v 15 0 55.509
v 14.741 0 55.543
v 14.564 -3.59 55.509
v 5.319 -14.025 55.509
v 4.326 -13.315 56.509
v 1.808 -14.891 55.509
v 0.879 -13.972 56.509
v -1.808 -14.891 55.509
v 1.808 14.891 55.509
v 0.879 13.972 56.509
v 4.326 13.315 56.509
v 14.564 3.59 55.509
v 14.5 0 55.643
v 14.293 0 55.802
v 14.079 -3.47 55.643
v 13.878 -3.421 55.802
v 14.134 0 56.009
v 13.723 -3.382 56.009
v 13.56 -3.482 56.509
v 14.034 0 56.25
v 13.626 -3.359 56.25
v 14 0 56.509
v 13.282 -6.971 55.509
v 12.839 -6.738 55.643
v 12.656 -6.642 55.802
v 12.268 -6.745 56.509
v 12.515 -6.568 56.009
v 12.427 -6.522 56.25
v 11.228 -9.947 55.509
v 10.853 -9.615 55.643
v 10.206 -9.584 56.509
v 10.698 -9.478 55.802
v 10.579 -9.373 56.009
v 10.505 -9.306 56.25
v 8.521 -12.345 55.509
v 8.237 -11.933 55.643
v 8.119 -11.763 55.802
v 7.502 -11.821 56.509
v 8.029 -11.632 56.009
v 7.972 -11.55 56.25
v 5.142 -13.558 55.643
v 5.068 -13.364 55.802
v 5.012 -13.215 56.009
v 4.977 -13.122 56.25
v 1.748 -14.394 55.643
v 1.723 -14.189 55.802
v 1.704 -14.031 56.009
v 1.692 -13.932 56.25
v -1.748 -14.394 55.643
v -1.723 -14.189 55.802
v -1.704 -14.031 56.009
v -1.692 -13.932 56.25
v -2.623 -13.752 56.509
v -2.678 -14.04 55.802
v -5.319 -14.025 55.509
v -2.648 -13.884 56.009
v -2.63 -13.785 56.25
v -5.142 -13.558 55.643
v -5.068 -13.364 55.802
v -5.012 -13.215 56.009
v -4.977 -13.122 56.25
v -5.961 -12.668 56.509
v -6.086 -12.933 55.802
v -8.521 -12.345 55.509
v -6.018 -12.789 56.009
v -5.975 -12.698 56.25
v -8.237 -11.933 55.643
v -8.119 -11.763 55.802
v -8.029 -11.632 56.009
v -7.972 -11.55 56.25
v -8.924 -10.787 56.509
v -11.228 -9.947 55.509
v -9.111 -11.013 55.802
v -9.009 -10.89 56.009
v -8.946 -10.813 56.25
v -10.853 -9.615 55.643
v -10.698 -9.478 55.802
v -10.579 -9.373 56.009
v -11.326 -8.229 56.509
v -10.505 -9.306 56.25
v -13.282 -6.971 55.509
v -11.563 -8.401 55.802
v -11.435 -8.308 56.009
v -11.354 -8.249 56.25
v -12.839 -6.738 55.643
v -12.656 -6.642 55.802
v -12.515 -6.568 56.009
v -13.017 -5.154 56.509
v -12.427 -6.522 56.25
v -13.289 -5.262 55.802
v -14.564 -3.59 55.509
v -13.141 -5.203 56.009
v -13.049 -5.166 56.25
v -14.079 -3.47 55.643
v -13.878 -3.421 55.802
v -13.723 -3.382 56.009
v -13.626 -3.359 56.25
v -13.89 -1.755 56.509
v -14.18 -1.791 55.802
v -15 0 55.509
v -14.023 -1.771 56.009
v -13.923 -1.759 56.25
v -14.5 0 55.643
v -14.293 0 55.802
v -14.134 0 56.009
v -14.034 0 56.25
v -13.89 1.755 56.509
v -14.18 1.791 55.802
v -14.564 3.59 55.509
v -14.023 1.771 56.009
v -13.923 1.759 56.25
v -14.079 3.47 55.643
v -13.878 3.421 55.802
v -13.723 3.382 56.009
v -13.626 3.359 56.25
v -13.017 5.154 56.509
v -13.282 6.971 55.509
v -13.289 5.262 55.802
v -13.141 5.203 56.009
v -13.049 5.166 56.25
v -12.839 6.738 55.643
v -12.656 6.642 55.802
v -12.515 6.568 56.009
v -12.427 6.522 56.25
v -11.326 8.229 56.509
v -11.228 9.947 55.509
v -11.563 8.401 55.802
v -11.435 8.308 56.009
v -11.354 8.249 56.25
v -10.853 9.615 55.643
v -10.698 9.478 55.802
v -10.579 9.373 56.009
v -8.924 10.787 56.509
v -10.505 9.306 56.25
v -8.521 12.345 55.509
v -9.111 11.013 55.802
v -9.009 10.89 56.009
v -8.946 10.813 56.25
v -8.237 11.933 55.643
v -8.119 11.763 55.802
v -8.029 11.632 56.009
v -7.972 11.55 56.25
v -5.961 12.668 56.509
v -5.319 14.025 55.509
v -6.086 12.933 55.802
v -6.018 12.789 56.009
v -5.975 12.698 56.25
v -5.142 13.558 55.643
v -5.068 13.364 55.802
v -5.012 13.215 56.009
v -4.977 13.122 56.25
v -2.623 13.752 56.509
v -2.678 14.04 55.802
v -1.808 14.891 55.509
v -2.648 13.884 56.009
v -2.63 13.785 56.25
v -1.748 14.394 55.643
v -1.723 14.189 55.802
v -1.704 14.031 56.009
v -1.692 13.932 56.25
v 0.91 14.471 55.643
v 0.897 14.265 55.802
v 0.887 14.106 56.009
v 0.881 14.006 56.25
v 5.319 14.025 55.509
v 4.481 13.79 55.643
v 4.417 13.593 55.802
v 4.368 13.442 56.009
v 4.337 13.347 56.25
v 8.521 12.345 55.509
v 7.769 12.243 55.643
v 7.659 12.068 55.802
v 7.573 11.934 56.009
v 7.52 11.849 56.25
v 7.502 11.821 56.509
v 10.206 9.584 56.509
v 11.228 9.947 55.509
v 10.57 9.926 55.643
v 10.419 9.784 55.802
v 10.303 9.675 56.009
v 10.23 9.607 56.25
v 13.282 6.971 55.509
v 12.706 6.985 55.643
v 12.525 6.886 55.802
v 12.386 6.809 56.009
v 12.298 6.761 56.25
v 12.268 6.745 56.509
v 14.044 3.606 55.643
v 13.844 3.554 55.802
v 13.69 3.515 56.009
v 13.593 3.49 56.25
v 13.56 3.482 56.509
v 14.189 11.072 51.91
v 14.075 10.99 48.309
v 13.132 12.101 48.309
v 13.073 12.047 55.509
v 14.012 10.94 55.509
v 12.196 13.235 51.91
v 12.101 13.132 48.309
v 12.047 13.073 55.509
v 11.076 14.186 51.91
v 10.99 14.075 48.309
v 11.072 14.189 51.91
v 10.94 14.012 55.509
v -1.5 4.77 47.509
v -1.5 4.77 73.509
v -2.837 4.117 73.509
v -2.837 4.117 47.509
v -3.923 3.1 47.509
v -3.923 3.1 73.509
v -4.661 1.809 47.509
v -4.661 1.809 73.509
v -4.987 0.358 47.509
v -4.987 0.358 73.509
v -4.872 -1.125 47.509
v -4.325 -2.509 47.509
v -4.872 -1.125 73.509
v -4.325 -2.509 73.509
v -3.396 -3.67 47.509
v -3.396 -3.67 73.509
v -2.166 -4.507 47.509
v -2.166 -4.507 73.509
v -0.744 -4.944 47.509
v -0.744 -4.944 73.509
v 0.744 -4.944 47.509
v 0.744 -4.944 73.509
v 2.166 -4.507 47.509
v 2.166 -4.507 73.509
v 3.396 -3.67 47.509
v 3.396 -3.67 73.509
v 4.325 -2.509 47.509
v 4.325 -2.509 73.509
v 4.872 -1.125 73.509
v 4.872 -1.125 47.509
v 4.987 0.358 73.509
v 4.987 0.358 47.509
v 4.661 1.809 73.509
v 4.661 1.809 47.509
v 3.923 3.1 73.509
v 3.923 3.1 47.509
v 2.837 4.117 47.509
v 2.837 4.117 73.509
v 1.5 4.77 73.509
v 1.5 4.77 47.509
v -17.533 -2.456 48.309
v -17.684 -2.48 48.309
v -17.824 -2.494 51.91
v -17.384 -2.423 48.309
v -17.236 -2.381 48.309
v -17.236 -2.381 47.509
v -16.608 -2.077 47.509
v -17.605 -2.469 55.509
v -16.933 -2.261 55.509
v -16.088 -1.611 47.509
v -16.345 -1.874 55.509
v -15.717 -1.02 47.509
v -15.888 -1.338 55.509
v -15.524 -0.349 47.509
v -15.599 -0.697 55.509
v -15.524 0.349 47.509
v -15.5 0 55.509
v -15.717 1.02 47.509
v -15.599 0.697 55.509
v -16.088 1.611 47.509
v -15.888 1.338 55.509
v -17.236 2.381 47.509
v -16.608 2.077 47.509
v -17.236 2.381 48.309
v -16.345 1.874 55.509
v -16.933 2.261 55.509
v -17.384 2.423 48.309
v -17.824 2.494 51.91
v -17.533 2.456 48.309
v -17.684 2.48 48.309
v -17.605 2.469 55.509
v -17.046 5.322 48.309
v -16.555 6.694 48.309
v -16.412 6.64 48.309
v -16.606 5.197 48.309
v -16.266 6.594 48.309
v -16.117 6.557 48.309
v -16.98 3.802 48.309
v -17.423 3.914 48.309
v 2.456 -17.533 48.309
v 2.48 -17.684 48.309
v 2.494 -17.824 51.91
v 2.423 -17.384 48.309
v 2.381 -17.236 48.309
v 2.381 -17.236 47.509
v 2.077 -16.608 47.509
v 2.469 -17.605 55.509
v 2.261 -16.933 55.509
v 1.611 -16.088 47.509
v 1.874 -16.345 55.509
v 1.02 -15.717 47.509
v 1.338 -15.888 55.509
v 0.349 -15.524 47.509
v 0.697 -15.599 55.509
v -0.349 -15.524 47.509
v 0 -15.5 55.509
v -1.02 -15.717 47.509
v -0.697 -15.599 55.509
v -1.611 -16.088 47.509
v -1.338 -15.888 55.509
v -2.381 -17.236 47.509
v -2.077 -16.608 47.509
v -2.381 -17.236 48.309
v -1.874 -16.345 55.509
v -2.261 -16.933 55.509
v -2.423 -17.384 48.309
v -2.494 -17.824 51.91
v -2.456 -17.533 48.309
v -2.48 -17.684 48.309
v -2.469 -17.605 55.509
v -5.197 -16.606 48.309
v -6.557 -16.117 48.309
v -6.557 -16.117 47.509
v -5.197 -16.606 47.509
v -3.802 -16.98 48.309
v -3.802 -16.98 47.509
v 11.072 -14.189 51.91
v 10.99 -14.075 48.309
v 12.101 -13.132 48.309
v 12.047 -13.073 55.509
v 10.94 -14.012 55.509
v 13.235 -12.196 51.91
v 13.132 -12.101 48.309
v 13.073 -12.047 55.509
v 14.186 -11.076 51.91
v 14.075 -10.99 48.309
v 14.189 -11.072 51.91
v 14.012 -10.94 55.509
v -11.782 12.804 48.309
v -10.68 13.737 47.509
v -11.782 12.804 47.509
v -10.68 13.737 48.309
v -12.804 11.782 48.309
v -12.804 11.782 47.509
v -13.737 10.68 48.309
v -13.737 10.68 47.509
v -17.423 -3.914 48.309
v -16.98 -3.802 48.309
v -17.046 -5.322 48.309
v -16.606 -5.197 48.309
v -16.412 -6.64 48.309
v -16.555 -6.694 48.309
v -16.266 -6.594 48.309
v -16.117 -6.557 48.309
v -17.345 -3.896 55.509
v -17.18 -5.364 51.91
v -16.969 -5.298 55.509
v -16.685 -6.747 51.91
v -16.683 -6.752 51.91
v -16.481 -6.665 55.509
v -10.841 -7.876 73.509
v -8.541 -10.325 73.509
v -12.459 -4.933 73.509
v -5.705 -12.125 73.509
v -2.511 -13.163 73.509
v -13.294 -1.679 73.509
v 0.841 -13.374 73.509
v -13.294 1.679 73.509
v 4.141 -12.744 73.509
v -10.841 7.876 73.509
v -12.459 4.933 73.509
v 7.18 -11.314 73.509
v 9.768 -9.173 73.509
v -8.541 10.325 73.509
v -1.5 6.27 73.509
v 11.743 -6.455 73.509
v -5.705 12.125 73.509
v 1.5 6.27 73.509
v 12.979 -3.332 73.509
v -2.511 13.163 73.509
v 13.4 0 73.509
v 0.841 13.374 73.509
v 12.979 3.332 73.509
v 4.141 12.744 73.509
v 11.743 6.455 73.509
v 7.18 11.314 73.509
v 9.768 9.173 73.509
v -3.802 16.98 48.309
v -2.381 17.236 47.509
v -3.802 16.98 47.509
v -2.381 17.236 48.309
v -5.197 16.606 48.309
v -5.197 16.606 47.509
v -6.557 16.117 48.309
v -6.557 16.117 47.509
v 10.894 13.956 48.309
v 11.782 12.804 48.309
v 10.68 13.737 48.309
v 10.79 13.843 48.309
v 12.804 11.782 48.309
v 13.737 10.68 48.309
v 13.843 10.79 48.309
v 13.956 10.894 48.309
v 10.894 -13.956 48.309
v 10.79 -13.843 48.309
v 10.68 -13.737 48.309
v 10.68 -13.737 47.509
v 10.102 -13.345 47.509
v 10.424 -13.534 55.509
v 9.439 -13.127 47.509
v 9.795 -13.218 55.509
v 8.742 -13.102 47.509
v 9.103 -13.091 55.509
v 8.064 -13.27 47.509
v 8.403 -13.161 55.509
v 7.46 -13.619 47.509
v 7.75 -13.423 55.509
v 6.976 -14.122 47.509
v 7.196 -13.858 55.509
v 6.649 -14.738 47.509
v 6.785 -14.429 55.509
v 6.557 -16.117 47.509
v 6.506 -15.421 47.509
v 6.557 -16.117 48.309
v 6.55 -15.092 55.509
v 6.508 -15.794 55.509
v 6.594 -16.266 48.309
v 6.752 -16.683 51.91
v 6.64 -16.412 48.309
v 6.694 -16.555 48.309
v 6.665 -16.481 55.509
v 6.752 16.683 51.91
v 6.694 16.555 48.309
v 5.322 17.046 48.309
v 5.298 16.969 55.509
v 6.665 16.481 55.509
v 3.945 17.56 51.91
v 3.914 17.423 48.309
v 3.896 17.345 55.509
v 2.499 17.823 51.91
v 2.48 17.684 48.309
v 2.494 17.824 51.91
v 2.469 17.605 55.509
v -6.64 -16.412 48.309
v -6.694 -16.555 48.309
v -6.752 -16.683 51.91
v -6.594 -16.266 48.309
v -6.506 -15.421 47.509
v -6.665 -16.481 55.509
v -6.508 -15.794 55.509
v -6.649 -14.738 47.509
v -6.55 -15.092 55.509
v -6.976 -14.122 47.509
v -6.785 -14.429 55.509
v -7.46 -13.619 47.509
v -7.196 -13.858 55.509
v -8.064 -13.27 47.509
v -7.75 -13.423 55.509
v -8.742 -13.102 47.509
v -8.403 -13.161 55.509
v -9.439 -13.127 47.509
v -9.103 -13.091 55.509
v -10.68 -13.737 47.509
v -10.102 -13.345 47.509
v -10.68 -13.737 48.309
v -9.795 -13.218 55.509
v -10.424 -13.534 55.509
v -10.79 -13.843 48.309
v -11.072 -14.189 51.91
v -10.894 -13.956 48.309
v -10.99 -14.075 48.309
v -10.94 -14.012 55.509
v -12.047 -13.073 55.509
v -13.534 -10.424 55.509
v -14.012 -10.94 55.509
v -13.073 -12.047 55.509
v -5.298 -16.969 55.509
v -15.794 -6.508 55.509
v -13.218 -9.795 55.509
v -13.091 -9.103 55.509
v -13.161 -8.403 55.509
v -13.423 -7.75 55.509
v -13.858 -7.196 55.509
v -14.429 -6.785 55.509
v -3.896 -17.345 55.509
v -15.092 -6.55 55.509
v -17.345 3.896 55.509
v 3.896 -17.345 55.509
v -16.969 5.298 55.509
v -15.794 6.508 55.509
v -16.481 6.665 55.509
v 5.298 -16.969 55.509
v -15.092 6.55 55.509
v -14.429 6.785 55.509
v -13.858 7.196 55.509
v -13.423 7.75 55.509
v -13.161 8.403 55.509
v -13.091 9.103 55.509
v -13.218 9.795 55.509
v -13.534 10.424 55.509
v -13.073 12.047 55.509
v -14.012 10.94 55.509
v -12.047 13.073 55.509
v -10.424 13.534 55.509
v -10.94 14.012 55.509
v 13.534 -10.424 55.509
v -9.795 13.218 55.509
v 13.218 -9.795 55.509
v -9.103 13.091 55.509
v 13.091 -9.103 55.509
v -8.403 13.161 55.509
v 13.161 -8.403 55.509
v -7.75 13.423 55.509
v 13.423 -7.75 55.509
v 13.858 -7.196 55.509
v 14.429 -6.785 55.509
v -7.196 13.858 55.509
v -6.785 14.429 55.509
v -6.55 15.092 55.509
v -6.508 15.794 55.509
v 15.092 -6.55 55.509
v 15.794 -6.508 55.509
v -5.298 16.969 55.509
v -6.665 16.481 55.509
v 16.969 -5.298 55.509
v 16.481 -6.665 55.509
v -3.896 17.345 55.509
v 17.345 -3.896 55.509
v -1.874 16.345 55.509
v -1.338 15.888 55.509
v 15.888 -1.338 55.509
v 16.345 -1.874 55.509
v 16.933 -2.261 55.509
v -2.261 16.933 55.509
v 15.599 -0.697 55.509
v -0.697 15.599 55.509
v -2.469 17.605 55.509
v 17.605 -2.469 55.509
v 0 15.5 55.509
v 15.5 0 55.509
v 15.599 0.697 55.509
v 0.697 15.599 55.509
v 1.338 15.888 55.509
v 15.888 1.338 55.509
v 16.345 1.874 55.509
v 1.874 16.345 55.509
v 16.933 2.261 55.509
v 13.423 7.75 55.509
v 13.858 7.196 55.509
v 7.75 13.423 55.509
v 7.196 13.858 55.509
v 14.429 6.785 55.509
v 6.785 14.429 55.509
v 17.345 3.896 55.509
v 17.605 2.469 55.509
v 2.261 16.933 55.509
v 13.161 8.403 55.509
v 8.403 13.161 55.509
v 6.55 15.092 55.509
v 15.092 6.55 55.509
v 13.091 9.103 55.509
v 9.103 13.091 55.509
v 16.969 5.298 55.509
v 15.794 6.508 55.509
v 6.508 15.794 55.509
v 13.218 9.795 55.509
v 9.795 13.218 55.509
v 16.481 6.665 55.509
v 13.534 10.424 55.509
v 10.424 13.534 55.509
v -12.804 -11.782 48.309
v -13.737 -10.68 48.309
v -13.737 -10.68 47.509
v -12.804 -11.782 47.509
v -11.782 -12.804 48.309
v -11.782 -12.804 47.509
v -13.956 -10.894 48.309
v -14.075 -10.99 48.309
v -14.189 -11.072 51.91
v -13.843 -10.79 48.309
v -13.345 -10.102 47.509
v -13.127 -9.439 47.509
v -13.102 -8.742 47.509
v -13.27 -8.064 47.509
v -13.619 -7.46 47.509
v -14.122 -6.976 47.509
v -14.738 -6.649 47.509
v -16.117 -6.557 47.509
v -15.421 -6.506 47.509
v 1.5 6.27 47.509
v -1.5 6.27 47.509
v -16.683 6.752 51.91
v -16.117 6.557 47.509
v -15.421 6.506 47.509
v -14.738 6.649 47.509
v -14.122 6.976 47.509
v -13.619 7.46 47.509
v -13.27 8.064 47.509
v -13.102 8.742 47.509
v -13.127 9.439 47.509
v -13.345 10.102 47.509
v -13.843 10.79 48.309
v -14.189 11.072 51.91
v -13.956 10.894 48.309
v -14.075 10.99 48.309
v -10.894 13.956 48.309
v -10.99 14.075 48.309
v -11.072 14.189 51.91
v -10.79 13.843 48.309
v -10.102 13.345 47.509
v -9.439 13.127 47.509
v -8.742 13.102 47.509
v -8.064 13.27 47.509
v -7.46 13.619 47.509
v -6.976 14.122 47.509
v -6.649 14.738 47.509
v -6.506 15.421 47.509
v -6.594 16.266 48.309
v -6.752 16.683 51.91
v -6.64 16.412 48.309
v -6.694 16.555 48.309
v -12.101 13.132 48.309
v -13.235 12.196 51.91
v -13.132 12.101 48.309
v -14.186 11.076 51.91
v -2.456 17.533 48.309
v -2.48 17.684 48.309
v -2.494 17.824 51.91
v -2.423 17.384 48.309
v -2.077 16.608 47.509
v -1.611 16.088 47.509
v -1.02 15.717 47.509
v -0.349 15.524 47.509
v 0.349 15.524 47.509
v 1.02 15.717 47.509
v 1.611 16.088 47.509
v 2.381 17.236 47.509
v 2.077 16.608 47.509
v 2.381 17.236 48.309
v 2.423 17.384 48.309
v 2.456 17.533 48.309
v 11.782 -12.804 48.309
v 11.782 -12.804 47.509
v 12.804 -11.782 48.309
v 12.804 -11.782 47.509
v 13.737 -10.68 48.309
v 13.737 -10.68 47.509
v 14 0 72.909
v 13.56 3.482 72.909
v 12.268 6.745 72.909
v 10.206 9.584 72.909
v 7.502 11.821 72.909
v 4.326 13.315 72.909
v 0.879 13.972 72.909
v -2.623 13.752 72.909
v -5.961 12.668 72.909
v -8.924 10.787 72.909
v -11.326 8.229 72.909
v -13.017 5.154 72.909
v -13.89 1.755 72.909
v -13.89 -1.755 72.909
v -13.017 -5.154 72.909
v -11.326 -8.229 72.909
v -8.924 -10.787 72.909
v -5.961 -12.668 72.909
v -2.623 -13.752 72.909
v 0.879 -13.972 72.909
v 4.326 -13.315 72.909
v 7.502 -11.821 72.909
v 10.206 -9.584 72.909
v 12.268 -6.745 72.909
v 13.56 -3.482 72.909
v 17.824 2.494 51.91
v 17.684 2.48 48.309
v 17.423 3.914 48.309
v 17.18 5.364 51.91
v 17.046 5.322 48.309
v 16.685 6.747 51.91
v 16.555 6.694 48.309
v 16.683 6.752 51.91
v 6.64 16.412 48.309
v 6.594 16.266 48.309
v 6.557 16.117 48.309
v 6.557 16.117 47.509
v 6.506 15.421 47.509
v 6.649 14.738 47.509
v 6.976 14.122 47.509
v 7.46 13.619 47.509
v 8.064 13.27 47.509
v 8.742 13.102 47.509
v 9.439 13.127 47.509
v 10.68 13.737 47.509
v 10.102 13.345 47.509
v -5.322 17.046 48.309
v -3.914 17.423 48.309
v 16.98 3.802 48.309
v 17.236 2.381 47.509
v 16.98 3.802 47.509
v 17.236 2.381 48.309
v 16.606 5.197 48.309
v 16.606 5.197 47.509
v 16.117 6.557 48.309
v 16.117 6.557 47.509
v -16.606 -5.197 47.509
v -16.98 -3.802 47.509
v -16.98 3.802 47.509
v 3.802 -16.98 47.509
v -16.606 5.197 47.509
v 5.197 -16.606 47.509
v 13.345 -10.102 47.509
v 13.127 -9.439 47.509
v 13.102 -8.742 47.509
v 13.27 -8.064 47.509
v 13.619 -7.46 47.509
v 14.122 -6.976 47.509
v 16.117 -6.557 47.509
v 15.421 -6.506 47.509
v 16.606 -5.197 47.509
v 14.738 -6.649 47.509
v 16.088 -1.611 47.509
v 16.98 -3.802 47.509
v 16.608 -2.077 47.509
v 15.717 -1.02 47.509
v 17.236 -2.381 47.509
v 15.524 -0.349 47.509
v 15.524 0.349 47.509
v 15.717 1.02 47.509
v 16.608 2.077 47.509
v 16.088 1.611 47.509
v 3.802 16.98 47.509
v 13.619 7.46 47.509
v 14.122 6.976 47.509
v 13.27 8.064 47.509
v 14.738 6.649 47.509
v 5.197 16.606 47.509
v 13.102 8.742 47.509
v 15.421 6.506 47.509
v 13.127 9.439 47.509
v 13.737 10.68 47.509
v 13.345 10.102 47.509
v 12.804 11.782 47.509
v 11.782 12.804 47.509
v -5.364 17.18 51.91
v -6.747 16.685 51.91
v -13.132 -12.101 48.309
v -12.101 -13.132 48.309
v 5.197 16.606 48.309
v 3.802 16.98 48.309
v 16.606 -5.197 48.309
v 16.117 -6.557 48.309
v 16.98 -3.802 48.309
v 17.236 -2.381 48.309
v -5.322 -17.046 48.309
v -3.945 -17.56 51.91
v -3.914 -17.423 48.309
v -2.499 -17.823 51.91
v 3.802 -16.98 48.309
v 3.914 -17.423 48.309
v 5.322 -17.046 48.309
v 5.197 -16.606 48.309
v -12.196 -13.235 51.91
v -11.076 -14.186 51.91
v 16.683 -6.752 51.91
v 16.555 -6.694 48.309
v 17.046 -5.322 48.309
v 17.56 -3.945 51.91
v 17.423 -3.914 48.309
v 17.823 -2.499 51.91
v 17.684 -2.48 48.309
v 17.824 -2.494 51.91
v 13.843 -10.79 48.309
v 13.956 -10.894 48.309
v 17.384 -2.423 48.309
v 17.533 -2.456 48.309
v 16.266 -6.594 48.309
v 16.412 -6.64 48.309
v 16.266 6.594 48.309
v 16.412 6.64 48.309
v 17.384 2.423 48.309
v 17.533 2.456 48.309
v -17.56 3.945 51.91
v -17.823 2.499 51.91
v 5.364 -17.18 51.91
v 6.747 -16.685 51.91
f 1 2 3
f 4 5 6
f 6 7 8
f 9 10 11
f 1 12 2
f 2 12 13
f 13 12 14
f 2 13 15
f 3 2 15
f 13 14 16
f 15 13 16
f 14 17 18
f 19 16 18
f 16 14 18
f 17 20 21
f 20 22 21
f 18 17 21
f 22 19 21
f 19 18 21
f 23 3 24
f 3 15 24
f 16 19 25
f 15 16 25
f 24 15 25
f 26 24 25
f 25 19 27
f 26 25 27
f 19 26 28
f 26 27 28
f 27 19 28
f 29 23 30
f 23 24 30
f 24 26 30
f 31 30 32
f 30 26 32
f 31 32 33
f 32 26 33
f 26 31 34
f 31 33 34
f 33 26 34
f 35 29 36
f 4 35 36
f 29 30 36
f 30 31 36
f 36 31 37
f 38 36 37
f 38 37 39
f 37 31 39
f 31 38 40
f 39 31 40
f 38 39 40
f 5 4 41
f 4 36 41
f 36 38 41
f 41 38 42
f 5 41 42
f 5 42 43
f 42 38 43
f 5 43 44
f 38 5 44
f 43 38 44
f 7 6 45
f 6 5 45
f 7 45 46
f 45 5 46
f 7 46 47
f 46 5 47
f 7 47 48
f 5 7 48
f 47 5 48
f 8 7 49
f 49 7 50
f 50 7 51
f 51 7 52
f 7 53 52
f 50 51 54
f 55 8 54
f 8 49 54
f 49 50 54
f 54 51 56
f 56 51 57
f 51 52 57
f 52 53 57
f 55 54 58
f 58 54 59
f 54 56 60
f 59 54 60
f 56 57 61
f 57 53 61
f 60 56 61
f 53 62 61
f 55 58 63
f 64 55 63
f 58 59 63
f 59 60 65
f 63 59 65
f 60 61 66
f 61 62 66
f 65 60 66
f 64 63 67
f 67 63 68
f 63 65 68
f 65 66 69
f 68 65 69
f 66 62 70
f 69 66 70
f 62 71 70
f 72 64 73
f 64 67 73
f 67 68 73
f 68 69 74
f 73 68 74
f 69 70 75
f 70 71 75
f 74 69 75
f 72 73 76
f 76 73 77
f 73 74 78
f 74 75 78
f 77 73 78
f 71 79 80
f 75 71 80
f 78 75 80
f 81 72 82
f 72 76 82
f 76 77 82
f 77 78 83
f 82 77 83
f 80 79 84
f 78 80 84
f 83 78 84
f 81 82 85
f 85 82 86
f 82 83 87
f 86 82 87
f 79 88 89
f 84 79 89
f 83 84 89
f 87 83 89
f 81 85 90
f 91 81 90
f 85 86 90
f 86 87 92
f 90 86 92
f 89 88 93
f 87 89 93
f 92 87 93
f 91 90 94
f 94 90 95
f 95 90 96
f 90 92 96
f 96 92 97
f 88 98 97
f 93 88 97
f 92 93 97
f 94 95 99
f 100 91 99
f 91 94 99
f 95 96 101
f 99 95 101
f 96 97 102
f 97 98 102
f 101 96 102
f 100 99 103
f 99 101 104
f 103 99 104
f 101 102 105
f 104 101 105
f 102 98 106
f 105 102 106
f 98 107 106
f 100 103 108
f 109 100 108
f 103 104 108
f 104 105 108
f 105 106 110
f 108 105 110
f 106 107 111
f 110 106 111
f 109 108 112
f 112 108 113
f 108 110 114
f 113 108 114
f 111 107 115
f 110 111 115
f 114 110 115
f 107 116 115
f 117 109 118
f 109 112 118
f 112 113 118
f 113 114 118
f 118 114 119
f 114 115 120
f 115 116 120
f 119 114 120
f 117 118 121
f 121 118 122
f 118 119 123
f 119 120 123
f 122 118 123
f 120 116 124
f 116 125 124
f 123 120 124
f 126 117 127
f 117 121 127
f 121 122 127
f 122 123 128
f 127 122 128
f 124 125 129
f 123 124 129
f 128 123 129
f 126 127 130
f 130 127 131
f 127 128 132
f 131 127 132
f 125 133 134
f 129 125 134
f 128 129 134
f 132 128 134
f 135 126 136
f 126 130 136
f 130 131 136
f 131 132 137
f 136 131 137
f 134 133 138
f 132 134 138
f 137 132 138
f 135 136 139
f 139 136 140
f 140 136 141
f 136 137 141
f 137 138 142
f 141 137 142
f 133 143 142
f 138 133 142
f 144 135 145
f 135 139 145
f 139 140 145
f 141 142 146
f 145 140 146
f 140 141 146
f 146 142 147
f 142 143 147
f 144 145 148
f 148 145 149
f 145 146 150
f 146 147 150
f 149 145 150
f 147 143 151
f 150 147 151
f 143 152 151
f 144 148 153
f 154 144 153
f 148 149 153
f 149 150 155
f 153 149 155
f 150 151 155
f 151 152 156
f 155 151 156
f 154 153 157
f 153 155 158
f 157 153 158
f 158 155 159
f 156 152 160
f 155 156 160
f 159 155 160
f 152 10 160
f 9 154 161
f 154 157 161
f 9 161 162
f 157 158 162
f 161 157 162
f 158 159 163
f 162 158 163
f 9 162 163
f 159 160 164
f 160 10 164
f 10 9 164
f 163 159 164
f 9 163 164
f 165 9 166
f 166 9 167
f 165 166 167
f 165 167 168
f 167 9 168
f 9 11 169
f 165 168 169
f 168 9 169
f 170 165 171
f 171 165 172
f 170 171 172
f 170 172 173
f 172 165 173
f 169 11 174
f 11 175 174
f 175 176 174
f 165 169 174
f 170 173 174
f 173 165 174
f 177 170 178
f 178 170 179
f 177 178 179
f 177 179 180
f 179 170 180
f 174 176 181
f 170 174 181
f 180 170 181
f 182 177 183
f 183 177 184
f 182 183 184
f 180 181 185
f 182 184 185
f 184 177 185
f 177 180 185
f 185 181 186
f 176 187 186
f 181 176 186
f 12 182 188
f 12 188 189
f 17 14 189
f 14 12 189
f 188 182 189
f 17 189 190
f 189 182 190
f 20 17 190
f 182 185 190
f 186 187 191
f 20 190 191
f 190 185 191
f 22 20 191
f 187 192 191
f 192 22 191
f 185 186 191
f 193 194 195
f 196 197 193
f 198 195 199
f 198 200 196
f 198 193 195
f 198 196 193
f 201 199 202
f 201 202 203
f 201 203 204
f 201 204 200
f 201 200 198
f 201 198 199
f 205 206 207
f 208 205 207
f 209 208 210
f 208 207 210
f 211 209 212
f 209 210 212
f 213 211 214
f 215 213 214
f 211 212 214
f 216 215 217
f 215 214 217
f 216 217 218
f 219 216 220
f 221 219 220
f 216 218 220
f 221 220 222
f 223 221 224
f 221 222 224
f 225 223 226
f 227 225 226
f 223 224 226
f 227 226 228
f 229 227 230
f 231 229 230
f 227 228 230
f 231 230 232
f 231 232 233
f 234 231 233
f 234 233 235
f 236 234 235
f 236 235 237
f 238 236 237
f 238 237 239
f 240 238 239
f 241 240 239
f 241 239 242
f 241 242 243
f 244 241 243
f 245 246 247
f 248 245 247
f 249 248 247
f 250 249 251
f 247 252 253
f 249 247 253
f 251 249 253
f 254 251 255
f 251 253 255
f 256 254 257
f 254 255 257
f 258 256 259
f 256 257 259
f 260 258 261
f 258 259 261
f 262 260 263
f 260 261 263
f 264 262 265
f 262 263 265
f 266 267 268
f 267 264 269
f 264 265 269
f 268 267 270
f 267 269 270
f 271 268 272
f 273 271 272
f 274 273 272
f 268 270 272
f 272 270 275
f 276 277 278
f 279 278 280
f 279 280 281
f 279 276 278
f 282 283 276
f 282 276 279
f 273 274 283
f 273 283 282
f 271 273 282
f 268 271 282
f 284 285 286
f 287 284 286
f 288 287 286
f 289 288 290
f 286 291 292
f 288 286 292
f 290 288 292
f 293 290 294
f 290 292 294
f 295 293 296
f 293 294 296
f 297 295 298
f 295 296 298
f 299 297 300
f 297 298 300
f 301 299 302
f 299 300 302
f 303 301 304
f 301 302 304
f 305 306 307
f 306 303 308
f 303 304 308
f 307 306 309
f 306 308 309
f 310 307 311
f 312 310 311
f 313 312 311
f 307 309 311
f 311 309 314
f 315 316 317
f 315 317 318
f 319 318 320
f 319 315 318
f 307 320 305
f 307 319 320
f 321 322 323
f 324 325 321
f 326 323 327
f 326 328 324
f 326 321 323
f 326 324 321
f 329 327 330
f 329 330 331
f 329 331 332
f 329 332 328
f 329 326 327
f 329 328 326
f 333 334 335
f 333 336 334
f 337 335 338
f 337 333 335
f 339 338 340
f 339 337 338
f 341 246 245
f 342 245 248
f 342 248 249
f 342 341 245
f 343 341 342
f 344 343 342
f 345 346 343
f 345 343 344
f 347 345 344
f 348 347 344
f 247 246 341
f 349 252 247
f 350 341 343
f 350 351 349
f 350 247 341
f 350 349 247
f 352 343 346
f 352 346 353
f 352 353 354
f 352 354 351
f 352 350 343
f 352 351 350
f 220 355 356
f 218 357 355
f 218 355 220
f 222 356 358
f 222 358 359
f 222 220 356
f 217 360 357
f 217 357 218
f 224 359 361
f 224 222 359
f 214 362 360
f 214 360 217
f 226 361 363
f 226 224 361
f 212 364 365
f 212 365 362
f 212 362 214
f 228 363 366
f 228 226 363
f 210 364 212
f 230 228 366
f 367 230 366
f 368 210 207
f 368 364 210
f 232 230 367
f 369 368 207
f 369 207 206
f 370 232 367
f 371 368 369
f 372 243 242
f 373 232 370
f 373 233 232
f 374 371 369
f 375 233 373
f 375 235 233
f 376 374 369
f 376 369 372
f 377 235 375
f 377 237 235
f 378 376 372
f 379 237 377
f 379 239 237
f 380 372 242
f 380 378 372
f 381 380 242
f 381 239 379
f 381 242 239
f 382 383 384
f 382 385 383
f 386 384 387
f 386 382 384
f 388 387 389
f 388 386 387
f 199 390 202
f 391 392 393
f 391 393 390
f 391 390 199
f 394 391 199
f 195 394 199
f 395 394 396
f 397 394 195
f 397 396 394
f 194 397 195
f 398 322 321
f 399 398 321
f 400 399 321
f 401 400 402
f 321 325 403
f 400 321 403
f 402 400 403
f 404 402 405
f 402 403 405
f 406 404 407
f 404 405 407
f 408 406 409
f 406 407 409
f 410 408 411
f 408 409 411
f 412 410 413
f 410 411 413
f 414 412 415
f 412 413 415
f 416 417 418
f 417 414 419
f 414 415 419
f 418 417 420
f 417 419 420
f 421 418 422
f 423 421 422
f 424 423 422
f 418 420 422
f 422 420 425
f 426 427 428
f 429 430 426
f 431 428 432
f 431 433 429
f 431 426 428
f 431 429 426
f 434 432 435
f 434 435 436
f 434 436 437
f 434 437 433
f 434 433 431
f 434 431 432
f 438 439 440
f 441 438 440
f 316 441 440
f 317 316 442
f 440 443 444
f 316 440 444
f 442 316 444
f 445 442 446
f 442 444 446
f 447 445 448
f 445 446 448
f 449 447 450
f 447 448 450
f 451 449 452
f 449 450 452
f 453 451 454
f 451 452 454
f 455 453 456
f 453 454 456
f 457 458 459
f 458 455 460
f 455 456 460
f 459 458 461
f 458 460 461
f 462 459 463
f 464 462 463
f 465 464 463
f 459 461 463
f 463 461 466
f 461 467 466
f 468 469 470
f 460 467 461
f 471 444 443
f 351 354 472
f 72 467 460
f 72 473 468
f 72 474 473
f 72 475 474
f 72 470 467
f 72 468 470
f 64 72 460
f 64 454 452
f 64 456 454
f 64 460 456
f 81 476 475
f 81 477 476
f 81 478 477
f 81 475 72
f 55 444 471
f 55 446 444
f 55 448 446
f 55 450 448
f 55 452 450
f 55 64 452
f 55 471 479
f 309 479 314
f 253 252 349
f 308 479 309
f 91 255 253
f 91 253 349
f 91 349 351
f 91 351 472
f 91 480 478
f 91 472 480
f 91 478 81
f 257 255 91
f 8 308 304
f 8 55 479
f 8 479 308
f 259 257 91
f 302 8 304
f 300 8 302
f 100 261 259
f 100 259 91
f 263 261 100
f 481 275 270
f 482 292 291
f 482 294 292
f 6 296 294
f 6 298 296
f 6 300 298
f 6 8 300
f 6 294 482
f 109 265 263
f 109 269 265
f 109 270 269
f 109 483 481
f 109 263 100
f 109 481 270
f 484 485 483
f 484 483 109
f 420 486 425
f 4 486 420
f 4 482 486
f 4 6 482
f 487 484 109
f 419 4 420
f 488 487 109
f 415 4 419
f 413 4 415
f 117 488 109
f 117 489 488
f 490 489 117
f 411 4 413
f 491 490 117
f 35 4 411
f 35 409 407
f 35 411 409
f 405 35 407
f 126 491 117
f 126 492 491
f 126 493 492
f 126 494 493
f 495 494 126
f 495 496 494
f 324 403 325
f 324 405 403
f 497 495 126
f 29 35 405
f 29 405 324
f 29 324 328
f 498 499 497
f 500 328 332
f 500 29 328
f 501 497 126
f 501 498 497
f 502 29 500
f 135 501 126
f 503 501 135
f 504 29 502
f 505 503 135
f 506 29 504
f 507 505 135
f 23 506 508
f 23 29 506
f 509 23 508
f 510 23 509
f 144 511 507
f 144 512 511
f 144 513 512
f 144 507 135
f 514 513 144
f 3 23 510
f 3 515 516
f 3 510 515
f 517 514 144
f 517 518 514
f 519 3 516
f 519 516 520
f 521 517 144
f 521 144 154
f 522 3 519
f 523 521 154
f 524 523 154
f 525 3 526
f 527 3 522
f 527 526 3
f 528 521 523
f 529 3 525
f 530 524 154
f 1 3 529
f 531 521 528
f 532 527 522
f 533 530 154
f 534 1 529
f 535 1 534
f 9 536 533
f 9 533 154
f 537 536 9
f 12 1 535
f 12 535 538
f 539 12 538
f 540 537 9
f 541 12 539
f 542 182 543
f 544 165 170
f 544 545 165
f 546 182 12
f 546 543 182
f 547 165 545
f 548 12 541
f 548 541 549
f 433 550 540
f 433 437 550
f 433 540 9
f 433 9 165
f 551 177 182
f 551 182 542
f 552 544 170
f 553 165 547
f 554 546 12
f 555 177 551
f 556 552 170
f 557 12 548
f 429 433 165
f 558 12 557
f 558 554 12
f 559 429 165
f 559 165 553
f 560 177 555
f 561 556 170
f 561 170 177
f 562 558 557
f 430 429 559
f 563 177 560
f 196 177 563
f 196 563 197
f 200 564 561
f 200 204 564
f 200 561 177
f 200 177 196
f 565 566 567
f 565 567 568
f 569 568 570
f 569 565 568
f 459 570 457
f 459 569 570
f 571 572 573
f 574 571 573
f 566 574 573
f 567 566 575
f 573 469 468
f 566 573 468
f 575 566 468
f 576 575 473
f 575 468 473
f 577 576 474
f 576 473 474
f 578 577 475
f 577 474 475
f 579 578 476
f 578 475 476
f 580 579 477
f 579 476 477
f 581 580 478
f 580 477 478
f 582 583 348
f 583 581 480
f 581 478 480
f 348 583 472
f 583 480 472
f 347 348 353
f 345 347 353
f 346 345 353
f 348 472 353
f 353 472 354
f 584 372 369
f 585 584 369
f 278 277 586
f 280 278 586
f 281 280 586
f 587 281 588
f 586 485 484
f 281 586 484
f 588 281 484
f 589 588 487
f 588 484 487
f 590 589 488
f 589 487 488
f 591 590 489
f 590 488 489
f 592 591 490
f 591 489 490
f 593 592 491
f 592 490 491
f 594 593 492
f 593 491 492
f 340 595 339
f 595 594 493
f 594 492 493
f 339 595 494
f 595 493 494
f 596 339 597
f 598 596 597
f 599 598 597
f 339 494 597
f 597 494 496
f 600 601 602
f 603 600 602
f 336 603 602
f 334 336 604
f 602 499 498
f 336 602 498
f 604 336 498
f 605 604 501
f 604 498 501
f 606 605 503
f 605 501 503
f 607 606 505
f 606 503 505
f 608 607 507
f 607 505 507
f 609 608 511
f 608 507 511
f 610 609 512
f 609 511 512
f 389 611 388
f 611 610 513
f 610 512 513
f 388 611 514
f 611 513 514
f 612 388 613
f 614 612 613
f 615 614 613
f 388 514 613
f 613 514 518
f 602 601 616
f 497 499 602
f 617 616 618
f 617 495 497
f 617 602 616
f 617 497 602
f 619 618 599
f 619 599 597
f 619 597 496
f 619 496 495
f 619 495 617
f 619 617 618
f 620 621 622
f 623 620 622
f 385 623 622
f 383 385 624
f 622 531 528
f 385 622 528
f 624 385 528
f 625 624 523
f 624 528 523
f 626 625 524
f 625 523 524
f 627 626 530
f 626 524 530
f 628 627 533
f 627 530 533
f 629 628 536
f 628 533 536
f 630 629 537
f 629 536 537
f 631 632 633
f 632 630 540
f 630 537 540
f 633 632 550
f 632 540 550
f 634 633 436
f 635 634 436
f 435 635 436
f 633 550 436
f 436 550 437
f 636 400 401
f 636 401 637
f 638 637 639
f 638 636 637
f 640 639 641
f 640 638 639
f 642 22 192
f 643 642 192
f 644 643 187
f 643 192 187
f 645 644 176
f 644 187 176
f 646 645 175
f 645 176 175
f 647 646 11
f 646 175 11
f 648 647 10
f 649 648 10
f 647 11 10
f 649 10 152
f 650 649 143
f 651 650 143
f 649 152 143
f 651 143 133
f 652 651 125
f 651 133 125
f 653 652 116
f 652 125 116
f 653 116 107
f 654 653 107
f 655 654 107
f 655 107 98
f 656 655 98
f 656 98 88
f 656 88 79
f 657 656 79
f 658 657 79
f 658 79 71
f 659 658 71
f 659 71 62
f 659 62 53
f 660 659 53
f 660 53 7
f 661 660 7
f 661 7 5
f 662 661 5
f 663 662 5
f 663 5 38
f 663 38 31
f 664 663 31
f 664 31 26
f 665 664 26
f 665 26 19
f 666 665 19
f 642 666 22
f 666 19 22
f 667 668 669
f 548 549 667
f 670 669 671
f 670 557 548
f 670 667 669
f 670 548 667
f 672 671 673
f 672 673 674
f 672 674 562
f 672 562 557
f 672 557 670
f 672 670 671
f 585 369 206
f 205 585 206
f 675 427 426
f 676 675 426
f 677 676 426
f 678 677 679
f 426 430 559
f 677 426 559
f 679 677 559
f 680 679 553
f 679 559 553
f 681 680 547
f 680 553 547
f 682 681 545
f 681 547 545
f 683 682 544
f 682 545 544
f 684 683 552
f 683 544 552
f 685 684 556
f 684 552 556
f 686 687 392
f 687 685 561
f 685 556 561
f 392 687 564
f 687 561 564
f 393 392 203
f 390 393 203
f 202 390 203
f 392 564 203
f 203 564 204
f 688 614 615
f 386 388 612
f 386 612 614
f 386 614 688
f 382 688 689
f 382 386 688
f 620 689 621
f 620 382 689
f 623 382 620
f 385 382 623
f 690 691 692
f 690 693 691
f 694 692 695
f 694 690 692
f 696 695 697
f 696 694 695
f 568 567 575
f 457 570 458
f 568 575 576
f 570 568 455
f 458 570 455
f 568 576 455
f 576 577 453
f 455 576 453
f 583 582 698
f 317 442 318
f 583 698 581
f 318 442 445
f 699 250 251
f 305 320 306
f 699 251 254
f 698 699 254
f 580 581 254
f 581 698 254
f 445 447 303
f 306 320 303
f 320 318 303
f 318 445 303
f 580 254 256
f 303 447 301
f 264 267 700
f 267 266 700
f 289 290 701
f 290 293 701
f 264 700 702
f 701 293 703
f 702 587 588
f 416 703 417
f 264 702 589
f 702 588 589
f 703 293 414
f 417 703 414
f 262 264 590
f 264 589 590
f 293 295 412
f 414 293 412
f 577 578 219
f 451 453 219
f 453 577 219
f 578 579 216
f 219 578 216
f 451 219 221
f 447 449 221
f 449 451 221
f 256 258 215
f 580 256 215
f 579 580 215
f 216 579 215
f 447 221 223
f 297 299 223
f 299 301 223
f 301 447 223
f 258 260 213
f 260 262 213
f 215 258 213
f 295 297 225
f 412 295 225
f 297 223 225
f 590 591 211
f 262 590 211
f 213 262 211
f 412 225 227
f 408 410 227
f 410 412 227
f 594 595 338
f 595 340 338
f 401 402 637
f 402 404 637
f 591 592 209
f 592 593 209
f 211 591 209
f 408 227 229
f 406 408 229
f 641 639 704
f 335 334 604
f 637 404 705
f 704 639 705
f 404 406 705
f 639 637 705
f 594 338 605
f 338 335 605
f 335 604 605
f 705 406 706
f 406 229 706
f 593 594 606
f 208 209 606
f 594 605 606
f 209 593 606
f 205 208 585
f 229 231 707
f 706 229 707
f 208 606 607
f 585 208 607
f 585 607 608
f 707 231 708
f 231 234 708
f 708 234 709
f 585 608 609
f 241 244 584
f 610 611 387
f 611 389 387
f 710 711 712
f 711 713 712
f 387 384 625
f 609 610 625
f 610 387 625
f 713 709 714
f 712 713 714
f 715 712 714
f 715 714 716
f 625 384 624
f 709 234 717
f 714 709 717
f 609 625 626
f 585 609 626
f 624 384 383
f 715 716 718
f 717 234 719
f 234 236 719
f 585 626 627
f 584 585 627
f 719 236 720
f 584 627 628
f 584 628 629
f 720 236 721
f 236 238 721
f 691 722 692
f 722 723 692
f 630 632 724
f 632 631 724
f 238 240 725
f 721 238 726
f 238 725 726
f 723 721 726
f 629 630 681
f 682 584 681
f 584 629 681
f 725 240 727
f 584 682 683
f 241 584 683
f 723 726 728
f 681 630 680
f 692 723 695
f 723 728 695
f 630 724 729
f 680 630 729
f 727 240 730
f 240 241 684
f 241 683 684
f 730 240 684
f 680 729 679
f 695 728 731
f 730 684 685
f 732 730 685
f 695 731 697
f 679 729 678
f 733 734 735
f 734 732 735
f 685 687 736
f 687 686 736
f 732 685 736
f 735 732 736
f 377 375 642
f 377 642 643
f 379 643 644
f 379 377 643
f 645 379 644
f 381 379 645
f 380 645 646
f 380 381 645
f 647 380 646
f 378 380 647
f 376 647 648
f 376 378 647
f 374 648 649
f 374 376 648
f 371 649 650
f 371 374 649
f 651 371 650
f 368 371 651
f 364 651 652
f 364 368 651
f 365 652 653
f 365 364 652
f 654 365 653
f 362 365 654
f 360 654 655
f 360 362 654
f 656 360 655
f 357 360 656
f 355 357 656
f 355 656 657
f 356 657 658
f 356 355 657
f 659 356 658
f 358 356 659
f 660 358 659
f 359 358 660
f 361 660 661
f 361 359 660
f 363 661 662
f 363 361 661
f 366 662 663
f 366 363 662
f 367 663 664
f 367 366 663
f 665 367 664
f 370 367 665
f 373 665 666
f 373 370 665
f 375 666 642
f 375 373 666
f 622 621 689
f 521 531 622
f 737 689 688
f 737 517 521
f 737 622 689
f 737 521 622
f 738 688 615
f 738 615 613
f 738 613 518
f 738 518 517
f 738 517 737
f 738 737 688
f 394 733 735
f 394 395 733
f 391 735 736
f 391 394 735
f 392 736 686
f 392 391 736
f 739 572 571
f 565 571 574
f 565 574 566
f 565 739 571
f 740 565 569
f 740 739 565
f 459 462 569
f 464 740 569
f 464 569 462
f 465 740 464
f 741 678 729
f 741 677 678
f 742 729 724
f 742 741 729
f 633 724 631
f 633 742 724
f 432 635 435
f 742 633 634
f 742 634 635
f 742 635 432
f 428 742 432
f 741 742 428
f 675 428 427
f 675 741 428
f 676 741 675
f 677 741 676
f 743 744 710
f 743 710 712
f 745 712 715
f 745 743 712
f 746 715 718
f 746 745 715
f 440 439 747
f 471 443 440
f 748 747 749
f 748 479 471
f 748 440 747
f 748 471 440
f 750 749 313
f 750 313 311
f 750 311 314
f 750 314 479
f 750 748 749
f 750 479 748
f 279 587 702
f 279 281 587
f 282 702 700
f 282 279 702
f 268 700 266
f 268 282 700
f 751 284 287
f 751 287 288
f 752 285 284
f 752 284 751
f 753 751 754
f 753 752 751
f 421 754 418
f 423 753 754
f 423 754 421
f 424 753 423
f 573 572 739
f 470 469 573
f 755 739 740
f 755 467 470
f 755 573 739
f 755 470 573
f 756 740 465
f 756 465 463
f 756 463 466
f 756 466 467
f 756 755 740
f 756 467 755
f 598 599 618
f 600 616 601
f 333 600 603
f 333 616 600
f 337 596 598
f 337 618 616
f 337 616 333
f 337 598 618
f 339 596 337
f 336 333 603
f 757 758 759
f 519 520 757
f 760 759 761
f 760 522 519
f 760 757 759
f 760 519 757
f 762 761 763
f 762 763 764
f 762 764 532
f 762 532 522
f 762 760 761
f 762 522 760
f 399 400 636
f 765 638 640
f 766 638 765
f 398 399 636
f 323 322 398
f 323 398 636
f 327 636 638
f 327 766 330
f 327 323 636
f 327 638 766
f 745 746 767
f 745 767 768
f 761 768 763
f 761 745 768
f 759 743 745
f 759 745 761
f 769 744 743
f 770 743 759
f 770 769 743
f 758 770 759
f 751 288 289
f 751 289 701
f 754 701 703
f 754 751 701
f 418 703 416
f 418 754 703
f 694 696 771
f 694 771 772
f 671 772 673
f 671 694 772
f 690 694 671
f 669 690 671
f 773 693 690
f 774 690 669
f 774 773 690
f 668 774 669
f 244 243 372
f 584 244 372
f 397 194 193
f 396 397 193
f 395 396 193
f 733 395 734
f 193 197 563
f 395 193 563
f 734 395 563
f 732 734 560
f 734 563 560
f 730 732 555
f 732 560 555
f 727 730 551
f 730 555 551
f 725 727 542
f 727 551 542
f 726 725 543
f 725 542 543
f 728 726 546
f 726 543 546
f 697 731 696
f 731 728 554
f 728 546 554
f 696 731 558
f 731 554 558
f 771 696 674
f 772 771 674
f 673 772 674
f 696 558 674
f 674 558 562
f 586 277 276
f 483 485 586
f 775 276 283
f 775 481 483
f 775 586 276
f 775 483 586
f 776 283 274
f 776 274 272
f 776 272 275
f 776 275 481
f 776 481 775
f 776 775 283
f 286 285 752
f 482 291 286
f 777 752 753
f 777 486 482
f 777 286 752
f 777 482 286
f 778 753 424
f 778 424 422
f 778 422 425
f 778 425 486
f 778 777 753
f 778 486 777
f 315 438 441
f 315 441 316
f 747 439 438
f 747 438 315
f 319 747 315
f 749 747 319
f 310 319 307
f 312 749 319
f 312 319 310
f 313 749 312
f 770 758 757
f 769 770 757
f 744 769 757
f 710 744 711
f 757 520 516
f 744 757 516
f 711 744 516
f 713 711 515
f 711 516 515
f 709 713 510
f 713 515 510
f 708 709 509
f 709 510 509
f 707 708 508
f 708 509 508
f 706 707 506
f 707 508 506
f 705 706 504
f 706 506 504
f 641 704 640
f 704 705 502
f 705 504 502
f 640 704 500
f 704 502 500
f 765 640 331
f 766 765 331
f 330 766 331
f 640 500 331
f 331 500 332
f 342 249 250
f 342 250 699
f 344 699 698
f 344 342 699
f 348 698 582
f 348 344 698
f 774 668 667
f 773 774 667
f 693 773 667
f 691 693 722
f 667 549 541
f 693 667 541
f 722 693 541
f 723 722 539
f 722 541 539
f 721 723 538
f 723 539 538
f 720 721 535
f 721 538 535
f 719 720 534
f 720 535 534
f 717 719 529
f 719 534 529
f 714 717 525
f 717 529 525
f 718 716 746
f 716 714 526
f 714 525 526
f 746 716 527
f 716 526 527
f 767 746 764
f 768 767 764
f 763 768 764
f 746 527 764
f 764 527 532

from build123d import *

# Parameters (mm, degrees)
SKETCH_1_R          = 130
EXTRUDE_1_DEPTH     = 40
SKETCH_2_R          = 70
EXTRUDE_2_DEPTH     = 130
SKETCH_4_R          = 12.5
CUT_EXTRUDE_1_DEPTH = 70
FILLET_1_R          = 5
CHAMFER_1_SIZE      = 3
SCALE_1_SCALE       = 0.2
CUT_EXTRUDE_3_DEPTH = 37.215474988


with BuildPart() as part:
    # 草图1 → 凸台-拉伸1 (new body)
    with BuildSketch(Plane.XY):
        Circle(SKETCH_1_R)
    extrude(amount=EXTRUDE_1_DEPTH)

    # 草图2 → 凸台-拉伸2 (add)
    with BuildSketch(Plane.XY):
        Circle(SKETCH_2_R)
    extrude(amount=EXTRUDE_2_DEPTH)

    # 草图3 → 切除-旋转1 (revolve, cut)
    with BuildSketch(Plane(origin=(0, 0, 0), x_dir=(1, 0, 0), z_dir=(0, 1, 0))):
        with BuildLine():
            Line((-87, 0), (-87, -4))
            Line((-87, -4), (-89.287478648, -4))
            ThreePointArc((-89.287478648, -4), (-89.988776291, -22.010076897), (-88.8854382, -40))
            Line((-88.8854382, -40), (-140, -40))
            Line((-140, -40), (-140, 0))
            Line((-140, 0), (-87, 0))
        make_face()
    revolve(axis=Axis((0, 0, -59.373086337), (0, 0, 1)), mode=Mode.SUBTRACT)

    # 草图4 → 切除-拉伸1 (cut)
    with BuildSketch(Plane.XY.offset(40)):
        with Locations((0, 90)):
            Circle(SKETCH_4_R)
        with Locations((45, 77.942286341)):
            Circle(SKETCH_4_R)
        with Locations((77.942286341, 45)):
            Circle(SKETCH_4_R)
        with Locations((90, 0)):
            Circle(SKETCH_4_R)
        with Locations((77.942286341, -45)):
            Circle(SKETCH_4_R)
        with Locations((45, -77.942286341)):
            Circle(SKETCH_4_R)
        with Locations((0, -90)):
            Circle(SKETCH_4_R)
        with Locations((-45, -77.942286341)):
            Circle(SKETCH_4_R)
        with Locations((-77.942286341, -45)):
            Circle(SKETCH_4_R)
        with Locations((-90, 0)):
            Circle(SKETCH_4_R)
        with Locations((-77.942286341, 45)):
            Circle(SKETCH_4_R)
        with Locations((-45, 77.942286341)):
            Circle(SKETCH_4_R)
    extrude(amount=-CUT_EXTRUDE_1_DEPTH, mode=Mode.SUBTRACT)

    # 圆角1
    fillet_1_edges = [part.edges().sort_by_distance(p)[0] for p in [
        (-70, 0, 40),
    ]]
    fillet(fillet_1_edges, radius=FILLET_1_R)

    # 倒角1
    chamfer_1_edges = [part.edges().sort_by_distance(p)[0] for p in [
        (-70, 0, 130),
    ]]
    chamfer(chamfer_1_edges, length=CHAMFER_1_SIZE)


with BuildPart() as part_1:
    # 缩放比例1: scaled about (0, 0, 59.385771994)
    add(part.part.scale(SCALE_1_SCALE).moved(Location((0, 0, 47.508617595))))

    # 草图8 → 切除-拉伸3 (cut, through all)
    with BuildSketch(Plane.XY.offset(73.508624031)):
        with BuildLine():
            Line((1.5, 4.769696007), (1.5, 6.269696007))
            Line((1.5, 6.269696007), (-1.5, 6.269696007))
            Line((-1.5, 6.269696007), (-1.5, 4.769696007))
            ThreePointArc((-1.5, 4.769696007), (0, -5), (1.5, 4.769696007))
        make_face()
    extrude(amount=-CUT_EXTRUDE_3_DEPTH, mode=Mode.SUBTRACT)


solid = part_1.part
